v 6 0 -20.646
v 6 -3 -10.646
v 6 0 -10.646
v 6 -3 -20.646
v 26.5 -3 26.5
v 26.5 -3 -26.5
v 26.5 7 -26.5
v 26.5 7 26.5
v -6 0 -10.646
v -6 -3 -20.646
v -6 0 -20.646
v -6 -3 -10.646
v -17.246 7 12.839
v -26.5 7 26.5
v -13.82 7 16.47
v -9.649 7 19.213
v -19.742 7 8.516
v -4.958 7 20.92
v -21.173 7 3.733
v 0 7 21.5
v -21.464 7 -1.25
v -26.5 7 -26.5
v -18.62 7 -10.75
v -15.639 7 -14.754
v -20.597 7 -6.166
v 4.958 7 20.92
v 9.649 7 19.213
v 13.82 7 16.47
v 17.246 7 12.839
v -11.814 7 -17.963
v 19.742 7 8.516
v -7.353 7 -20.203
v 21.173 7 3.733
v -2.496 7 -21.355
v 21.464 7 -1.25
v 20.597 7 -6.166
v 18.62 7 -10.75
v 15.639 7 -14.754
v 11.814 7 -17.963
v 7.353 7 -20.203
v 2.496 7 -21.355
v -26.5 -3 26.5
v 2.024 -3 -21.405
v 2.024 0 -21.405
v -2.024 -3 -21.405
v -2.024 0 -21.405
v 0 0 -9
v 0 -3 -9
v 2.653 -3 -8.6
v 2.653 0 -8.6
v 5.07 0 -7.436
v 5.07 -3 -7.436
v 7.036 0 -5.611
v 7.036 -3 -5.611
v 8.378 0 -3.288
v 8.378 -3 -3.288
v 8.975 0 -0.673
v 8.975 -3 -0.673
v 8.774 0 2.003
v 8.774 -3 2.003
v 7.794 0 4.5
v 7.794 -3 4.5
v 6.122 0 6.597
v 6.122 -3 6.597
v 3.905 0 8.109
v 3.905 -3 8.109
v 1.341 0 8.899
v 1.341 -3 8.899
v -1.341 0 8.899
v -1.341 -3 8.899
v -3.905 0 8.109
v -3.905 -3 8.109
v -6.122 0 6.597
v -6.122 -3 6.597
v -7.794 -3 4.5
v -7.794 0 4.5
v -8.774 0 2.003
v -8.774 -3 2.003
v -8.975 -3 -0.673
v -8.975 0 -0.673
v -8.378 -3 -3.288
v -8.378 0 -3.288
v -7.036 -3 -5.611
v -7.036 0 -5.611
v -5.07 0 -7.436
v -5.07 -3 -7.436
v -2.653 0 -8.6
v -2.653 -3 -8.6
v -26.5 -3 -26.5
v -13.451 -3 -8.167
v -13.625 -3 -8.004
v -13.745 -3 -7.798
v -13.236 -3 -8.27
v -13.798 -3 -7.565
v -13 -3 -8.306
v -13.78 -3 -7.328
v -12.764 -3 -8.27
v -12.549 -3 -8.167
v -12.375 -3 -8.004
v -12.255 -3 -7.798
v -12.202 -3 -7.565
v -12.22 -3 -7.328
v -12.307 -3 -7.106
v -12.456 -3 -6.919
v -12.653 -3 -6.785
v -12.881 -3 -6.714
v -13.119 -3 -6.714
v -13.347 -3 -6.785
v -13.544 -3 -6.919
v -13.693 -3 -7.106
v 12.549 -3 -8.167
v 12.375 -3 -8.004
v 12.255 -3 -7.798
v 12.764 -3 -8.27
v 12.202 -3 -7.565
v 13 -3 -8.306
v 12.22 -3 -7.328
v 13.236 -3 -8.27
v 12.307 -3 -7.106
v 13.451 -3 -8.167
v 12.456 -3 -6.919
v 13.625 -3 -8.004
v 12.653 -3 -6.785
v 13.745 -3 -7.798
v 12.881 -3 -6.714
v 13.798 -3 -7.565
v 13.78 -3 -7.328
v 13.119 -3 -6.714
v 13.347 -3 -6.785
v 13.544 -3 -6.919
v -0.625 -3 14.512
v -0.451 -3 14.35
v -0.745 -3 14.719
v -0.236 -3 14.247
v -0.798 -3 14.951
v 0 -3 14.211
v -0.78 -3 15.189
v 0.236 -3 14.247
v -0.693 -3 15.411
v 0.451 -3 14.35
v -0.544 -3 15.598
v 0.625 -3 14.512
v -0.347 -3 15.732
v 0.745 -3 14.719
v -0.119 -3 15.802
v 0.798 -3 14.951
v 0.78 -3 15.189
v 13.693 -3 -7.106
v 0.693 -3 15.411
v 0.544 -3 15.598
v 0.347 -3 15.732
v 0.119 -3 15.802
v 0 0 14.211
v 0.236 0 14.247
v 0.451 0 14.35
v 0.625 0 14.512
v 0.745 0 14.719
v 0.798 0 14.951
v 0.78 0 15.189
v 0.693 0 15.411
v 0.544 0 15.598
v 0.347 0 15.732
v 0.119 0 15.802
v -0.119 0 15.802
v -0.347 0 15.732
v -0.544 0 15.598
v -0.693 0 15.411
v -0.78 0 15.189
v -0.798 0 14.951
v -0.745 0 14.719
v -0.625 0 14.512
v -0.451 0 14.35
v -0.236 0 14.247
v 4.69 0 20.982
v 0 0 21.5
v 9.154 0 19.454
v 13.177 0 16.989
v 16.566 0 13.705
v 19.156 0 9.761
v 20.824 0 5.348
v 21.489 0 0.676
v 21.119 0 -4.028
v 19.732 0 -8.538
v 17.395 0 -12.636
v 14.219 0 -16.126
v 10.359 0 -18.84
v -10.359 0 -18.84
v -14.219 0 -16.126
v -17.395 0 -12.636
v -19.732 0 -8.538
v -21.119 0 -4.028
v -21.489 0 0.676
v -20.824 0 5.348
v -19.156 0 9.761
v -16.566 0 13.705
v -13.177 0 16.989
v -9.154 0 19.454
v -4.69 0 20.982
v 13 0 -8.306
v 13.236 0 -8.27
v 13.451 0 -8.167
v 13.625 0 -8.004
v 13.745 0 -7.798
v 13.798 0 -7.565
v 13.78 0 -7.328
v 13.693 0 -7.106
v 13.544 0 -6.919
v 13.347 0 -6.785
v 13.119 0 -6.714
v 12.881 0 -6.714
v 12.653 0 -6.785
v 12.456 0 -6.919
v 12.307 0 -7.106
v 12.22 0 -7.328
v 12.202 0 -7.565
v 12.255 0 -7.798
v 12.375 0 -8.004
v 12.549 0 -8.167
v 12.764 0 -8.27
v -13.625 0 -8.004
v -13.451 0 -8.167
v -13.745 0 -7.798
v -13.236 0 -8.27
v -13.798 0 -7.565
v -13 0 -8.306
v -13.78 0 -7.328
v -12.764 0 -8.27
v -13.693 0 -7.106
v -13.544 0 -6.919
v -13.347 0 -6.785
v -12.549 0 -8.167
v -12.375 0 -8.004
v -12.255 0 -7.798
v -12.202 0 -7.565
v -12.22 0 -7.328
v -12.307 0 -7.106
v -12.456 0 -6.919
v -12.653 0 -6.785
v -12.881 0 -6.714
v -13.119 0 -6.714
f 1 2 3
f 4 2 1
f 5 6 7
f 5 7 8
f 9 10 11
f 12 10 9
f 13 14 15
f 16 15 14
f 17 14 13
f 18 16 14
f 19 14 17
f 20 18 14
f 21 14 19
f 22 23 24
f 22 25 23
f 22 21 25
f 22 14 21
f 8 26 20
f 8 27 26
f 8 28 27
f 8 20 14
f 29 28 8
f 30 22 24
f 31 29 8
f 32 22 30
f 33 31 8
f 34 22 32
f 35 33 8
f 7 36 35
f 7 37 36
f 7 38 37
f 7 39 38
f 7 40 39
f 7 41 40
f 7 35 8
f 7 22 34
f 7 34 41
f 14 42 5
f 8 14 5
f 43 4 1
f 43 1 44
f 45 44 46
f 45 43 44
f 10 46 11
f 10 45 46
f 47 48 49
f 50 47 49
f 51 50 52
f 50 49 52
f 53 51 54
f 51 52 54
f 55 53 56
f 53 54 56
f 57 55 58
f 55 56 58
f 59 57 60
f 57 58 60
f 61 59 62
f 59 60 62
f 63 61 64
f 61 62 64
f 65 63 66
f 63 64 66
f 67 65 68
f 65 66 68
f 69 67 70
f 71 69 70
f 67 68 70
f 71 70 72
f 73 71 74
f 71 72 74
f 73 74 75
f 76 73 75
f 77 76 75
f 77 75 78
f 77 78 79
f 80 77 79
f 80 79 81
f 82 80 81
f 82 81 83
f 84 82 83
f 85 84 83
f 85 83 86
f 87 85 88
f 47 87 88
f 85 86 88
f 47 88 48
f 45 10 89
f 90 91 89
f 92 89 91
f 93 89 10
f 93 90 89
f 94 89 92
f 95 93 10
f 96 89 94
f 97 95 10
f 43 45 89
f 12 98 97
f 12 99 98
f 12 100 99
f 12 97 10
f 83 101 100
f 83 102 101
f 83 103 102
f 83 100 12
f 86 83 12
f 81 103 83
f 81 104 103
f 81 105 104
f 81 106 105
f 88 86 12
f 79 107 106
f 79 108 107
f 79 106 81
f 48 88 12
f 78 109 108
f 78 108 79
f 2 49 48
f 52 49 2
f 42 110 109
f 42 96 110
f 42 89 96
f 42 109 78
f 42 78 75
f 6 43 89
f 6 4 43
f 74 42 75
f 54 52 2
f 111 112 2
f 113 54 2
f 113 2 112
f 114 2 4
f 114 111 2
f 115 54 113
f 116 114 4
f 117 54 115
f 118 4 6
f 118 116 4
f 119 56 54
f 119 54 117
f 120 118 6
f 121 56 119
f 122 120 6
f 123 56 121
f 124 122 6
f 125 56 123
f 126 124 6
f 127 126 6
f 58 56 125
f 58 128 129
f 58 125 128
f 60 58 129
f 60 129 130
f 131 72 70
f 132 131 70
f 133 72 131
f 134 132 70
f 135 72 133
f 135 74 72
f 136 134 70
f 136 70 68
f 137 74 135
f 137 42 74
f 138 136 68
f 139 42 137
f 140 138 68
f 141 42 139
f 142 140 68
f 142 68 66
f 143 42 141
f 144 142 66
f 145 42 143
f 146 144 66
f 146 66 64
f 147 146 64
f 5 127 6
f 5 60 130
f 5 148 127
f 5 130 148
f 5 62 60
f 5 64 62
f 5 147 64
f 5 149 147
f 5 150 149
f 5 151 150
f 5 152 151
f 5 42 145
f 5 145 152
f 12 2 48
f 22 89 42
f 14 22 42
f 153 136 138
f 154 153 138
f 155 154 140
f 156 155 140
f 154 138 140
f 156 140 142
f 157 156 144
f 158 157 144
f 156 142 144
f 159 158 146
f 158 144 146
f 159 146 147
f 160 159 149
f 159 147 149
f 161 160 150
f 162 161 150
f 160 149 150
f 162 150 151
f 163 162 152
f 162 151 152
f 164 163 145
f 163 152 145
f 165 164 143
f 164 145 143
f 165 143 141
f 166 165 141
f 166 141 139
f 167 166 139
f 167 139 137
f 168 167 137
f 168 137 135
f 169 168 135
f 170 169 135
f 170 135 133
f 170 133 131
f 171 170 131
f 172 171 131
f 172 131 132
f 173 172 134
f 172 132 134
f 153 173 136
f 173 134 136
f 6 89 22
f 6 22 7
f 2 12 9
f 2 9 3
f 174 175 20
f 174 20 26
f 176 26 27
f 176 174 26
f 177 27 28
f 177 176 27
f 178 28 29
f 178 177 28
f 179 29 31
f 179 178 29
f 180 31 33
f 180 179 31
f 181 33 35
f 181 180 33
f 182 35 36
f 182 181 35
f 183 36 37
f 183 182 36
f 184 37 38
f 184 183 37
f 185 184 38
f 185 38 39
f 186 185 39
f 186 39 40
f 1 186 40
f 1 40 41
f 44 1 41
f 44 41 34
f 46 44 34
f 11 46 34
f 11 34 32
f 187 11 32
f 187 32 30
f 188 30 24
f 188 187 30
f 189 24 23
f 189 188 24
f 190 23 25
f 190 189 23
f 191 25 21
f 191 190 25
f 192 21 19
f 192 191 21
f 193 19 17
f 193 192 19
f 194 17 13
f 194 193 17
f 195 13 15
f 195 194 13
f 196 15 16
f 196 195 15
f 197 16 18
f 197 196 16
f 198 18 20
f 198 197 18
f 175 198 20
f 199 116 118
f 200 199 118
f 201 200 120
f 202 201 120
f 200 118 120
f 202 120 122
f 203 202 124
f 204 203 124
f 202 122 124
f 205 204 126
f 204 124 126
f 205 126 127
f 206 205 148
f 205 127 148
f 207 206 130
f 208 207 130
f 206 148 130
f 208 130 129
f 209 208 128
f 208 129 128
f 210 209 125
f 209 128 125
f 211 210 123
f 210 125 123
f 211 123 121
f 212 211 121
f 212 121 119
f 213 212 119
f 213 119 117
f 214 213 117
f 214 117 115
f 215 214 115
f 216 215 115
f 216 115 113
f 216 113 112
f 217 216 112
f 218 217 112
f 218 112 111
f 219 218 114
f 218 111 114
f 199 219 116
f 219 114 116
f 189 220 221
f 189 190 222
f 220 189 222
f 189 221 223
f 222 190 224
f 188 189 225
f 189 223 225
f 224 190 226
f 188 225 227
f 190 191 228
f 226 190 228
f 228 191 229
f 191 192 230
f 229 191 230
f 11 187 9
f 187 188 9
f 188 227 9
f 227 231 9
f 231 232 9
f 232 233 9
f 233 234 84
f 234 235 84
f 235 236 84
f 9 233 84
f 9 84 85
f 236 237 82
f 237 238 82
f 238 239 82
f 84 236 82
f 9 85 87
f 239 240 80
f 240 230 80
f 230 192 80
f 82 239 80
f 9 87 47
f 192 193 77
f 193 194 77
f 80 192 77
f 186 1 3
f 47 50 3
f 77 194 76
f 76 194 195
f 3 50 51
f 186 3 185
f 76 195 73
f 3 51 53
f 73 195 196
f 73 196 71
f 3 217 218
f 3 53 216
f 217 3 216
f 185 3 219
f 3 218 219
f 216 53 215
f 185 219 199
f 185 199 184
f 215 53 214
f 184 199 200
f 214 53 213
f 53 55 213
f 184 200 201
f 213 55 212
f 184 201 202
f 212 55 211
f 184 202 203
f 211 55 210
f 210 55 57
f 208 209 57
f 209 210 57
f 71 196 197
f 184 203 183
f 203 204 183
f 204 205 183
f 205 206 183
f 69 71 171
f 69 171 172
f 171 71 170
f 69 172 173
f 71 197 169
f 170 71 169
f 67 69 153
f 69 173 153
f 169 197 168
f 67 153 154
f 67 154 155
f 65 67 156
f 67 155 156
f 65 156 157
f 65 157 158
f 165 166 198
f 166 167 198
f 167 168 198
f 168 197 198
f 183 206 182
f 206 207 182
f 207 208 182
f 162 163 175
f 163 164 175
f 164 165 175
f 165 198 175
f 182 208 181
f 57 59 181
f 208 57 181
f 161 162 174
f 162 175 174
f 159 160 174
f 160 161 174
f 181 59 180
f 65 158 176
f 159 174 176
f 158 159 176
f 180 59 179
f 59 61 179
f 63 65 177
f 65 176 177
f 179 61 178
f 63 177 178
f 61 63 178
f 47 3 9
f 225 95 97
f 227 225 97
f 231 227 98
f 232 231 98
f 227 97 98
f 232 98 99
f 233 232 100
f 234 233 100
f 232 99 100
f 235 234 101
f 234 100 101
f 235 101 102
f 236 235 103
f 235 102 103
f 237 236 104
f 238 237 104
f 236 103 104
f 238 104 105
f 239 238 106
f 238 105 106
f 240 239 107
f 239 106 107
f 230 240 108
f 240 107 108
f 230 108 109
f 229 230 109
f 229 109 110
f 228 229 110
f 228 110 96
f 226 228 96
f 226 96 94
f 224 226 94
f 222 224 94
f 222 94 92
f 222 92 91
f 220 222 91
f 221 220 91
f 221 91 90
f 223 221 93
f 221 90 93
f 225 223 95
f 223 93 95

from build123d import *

# Parameters (mm, degrees)
SKETCH_1_W      = 53
SKETCH_1_H      = 53
SKETCH_1_R      = 21.5
EXTRUDE_1_DEPTH = 7
EXTRUDE_START   = 3
SKETCH_2_W      = 53
SKETCH_2_H      = 53
SKETCH_2_R      = 0.8
SKETCH_2_R_2    = 9
EXTRUDE_2_DEPTH = 3


with BuildPart() as part:
    # 草图1 → 凸台-拉伸1 (new body)
    with BuildSketch(Plane(origin=(0, 0, 0), x_dir=(1, 0, 0), z_dir=(0, 1, 0))):
        Rectangle(SKETCH_1_W, SKETCH_1_H)
        with Locations(Location((0, 0, 0), (0, 0, 270))):
            Circle(SKETCH_1_R, mode=Mode.SUBTRACT)
    extrude(amount=EXTRUDE_1_DEPTH)

    # 草图2 → 凸台-拉伸2 (add)
    with BuildSketch(Plane.XZ.offset(EXTRUDE_START)):
        Rectangle(SKETCH_2_W, SKETCH_2_H)
        with Locations(Location((-13, -7.505553499, 0), (0, 0, 270))):
            Circle(SKETCH_2_R, mode=Mode.SUBTRACT)
        with Locations(Location((0, 15.011106999, 0), (0, 0, 270))):
            Circle(SKETCH_2_R, mode=Mode.SUBTRACT)
        with Locations(Location((13, -7.505553499, 0), (0, 0, 270))):
            Circle(SKETCH_2_R, mode=Mode.SUBTRACT)
        with Locations(Location((0, 0, 0), (0, 0, 270))):
            Circle(SKETCH_2_R_2, mode=Mode.SUBTRACT)
        with BuildLine():
            Line((-6, -20.645822822), (-6, -10.645822822))
            Line((-6, -10.645822822), (6, -10.645822822))
            Line((6, -10.645822822), (6, -20.645822822))
            ThreePointArc((6, -20.645822822), (0, -21.5), (-6, -20.645822822))
        make_face(mode=Mode.SUBTRACT)
    extrude(amount=-EXTRUDE_2_DEPTH)


solid = part.part
